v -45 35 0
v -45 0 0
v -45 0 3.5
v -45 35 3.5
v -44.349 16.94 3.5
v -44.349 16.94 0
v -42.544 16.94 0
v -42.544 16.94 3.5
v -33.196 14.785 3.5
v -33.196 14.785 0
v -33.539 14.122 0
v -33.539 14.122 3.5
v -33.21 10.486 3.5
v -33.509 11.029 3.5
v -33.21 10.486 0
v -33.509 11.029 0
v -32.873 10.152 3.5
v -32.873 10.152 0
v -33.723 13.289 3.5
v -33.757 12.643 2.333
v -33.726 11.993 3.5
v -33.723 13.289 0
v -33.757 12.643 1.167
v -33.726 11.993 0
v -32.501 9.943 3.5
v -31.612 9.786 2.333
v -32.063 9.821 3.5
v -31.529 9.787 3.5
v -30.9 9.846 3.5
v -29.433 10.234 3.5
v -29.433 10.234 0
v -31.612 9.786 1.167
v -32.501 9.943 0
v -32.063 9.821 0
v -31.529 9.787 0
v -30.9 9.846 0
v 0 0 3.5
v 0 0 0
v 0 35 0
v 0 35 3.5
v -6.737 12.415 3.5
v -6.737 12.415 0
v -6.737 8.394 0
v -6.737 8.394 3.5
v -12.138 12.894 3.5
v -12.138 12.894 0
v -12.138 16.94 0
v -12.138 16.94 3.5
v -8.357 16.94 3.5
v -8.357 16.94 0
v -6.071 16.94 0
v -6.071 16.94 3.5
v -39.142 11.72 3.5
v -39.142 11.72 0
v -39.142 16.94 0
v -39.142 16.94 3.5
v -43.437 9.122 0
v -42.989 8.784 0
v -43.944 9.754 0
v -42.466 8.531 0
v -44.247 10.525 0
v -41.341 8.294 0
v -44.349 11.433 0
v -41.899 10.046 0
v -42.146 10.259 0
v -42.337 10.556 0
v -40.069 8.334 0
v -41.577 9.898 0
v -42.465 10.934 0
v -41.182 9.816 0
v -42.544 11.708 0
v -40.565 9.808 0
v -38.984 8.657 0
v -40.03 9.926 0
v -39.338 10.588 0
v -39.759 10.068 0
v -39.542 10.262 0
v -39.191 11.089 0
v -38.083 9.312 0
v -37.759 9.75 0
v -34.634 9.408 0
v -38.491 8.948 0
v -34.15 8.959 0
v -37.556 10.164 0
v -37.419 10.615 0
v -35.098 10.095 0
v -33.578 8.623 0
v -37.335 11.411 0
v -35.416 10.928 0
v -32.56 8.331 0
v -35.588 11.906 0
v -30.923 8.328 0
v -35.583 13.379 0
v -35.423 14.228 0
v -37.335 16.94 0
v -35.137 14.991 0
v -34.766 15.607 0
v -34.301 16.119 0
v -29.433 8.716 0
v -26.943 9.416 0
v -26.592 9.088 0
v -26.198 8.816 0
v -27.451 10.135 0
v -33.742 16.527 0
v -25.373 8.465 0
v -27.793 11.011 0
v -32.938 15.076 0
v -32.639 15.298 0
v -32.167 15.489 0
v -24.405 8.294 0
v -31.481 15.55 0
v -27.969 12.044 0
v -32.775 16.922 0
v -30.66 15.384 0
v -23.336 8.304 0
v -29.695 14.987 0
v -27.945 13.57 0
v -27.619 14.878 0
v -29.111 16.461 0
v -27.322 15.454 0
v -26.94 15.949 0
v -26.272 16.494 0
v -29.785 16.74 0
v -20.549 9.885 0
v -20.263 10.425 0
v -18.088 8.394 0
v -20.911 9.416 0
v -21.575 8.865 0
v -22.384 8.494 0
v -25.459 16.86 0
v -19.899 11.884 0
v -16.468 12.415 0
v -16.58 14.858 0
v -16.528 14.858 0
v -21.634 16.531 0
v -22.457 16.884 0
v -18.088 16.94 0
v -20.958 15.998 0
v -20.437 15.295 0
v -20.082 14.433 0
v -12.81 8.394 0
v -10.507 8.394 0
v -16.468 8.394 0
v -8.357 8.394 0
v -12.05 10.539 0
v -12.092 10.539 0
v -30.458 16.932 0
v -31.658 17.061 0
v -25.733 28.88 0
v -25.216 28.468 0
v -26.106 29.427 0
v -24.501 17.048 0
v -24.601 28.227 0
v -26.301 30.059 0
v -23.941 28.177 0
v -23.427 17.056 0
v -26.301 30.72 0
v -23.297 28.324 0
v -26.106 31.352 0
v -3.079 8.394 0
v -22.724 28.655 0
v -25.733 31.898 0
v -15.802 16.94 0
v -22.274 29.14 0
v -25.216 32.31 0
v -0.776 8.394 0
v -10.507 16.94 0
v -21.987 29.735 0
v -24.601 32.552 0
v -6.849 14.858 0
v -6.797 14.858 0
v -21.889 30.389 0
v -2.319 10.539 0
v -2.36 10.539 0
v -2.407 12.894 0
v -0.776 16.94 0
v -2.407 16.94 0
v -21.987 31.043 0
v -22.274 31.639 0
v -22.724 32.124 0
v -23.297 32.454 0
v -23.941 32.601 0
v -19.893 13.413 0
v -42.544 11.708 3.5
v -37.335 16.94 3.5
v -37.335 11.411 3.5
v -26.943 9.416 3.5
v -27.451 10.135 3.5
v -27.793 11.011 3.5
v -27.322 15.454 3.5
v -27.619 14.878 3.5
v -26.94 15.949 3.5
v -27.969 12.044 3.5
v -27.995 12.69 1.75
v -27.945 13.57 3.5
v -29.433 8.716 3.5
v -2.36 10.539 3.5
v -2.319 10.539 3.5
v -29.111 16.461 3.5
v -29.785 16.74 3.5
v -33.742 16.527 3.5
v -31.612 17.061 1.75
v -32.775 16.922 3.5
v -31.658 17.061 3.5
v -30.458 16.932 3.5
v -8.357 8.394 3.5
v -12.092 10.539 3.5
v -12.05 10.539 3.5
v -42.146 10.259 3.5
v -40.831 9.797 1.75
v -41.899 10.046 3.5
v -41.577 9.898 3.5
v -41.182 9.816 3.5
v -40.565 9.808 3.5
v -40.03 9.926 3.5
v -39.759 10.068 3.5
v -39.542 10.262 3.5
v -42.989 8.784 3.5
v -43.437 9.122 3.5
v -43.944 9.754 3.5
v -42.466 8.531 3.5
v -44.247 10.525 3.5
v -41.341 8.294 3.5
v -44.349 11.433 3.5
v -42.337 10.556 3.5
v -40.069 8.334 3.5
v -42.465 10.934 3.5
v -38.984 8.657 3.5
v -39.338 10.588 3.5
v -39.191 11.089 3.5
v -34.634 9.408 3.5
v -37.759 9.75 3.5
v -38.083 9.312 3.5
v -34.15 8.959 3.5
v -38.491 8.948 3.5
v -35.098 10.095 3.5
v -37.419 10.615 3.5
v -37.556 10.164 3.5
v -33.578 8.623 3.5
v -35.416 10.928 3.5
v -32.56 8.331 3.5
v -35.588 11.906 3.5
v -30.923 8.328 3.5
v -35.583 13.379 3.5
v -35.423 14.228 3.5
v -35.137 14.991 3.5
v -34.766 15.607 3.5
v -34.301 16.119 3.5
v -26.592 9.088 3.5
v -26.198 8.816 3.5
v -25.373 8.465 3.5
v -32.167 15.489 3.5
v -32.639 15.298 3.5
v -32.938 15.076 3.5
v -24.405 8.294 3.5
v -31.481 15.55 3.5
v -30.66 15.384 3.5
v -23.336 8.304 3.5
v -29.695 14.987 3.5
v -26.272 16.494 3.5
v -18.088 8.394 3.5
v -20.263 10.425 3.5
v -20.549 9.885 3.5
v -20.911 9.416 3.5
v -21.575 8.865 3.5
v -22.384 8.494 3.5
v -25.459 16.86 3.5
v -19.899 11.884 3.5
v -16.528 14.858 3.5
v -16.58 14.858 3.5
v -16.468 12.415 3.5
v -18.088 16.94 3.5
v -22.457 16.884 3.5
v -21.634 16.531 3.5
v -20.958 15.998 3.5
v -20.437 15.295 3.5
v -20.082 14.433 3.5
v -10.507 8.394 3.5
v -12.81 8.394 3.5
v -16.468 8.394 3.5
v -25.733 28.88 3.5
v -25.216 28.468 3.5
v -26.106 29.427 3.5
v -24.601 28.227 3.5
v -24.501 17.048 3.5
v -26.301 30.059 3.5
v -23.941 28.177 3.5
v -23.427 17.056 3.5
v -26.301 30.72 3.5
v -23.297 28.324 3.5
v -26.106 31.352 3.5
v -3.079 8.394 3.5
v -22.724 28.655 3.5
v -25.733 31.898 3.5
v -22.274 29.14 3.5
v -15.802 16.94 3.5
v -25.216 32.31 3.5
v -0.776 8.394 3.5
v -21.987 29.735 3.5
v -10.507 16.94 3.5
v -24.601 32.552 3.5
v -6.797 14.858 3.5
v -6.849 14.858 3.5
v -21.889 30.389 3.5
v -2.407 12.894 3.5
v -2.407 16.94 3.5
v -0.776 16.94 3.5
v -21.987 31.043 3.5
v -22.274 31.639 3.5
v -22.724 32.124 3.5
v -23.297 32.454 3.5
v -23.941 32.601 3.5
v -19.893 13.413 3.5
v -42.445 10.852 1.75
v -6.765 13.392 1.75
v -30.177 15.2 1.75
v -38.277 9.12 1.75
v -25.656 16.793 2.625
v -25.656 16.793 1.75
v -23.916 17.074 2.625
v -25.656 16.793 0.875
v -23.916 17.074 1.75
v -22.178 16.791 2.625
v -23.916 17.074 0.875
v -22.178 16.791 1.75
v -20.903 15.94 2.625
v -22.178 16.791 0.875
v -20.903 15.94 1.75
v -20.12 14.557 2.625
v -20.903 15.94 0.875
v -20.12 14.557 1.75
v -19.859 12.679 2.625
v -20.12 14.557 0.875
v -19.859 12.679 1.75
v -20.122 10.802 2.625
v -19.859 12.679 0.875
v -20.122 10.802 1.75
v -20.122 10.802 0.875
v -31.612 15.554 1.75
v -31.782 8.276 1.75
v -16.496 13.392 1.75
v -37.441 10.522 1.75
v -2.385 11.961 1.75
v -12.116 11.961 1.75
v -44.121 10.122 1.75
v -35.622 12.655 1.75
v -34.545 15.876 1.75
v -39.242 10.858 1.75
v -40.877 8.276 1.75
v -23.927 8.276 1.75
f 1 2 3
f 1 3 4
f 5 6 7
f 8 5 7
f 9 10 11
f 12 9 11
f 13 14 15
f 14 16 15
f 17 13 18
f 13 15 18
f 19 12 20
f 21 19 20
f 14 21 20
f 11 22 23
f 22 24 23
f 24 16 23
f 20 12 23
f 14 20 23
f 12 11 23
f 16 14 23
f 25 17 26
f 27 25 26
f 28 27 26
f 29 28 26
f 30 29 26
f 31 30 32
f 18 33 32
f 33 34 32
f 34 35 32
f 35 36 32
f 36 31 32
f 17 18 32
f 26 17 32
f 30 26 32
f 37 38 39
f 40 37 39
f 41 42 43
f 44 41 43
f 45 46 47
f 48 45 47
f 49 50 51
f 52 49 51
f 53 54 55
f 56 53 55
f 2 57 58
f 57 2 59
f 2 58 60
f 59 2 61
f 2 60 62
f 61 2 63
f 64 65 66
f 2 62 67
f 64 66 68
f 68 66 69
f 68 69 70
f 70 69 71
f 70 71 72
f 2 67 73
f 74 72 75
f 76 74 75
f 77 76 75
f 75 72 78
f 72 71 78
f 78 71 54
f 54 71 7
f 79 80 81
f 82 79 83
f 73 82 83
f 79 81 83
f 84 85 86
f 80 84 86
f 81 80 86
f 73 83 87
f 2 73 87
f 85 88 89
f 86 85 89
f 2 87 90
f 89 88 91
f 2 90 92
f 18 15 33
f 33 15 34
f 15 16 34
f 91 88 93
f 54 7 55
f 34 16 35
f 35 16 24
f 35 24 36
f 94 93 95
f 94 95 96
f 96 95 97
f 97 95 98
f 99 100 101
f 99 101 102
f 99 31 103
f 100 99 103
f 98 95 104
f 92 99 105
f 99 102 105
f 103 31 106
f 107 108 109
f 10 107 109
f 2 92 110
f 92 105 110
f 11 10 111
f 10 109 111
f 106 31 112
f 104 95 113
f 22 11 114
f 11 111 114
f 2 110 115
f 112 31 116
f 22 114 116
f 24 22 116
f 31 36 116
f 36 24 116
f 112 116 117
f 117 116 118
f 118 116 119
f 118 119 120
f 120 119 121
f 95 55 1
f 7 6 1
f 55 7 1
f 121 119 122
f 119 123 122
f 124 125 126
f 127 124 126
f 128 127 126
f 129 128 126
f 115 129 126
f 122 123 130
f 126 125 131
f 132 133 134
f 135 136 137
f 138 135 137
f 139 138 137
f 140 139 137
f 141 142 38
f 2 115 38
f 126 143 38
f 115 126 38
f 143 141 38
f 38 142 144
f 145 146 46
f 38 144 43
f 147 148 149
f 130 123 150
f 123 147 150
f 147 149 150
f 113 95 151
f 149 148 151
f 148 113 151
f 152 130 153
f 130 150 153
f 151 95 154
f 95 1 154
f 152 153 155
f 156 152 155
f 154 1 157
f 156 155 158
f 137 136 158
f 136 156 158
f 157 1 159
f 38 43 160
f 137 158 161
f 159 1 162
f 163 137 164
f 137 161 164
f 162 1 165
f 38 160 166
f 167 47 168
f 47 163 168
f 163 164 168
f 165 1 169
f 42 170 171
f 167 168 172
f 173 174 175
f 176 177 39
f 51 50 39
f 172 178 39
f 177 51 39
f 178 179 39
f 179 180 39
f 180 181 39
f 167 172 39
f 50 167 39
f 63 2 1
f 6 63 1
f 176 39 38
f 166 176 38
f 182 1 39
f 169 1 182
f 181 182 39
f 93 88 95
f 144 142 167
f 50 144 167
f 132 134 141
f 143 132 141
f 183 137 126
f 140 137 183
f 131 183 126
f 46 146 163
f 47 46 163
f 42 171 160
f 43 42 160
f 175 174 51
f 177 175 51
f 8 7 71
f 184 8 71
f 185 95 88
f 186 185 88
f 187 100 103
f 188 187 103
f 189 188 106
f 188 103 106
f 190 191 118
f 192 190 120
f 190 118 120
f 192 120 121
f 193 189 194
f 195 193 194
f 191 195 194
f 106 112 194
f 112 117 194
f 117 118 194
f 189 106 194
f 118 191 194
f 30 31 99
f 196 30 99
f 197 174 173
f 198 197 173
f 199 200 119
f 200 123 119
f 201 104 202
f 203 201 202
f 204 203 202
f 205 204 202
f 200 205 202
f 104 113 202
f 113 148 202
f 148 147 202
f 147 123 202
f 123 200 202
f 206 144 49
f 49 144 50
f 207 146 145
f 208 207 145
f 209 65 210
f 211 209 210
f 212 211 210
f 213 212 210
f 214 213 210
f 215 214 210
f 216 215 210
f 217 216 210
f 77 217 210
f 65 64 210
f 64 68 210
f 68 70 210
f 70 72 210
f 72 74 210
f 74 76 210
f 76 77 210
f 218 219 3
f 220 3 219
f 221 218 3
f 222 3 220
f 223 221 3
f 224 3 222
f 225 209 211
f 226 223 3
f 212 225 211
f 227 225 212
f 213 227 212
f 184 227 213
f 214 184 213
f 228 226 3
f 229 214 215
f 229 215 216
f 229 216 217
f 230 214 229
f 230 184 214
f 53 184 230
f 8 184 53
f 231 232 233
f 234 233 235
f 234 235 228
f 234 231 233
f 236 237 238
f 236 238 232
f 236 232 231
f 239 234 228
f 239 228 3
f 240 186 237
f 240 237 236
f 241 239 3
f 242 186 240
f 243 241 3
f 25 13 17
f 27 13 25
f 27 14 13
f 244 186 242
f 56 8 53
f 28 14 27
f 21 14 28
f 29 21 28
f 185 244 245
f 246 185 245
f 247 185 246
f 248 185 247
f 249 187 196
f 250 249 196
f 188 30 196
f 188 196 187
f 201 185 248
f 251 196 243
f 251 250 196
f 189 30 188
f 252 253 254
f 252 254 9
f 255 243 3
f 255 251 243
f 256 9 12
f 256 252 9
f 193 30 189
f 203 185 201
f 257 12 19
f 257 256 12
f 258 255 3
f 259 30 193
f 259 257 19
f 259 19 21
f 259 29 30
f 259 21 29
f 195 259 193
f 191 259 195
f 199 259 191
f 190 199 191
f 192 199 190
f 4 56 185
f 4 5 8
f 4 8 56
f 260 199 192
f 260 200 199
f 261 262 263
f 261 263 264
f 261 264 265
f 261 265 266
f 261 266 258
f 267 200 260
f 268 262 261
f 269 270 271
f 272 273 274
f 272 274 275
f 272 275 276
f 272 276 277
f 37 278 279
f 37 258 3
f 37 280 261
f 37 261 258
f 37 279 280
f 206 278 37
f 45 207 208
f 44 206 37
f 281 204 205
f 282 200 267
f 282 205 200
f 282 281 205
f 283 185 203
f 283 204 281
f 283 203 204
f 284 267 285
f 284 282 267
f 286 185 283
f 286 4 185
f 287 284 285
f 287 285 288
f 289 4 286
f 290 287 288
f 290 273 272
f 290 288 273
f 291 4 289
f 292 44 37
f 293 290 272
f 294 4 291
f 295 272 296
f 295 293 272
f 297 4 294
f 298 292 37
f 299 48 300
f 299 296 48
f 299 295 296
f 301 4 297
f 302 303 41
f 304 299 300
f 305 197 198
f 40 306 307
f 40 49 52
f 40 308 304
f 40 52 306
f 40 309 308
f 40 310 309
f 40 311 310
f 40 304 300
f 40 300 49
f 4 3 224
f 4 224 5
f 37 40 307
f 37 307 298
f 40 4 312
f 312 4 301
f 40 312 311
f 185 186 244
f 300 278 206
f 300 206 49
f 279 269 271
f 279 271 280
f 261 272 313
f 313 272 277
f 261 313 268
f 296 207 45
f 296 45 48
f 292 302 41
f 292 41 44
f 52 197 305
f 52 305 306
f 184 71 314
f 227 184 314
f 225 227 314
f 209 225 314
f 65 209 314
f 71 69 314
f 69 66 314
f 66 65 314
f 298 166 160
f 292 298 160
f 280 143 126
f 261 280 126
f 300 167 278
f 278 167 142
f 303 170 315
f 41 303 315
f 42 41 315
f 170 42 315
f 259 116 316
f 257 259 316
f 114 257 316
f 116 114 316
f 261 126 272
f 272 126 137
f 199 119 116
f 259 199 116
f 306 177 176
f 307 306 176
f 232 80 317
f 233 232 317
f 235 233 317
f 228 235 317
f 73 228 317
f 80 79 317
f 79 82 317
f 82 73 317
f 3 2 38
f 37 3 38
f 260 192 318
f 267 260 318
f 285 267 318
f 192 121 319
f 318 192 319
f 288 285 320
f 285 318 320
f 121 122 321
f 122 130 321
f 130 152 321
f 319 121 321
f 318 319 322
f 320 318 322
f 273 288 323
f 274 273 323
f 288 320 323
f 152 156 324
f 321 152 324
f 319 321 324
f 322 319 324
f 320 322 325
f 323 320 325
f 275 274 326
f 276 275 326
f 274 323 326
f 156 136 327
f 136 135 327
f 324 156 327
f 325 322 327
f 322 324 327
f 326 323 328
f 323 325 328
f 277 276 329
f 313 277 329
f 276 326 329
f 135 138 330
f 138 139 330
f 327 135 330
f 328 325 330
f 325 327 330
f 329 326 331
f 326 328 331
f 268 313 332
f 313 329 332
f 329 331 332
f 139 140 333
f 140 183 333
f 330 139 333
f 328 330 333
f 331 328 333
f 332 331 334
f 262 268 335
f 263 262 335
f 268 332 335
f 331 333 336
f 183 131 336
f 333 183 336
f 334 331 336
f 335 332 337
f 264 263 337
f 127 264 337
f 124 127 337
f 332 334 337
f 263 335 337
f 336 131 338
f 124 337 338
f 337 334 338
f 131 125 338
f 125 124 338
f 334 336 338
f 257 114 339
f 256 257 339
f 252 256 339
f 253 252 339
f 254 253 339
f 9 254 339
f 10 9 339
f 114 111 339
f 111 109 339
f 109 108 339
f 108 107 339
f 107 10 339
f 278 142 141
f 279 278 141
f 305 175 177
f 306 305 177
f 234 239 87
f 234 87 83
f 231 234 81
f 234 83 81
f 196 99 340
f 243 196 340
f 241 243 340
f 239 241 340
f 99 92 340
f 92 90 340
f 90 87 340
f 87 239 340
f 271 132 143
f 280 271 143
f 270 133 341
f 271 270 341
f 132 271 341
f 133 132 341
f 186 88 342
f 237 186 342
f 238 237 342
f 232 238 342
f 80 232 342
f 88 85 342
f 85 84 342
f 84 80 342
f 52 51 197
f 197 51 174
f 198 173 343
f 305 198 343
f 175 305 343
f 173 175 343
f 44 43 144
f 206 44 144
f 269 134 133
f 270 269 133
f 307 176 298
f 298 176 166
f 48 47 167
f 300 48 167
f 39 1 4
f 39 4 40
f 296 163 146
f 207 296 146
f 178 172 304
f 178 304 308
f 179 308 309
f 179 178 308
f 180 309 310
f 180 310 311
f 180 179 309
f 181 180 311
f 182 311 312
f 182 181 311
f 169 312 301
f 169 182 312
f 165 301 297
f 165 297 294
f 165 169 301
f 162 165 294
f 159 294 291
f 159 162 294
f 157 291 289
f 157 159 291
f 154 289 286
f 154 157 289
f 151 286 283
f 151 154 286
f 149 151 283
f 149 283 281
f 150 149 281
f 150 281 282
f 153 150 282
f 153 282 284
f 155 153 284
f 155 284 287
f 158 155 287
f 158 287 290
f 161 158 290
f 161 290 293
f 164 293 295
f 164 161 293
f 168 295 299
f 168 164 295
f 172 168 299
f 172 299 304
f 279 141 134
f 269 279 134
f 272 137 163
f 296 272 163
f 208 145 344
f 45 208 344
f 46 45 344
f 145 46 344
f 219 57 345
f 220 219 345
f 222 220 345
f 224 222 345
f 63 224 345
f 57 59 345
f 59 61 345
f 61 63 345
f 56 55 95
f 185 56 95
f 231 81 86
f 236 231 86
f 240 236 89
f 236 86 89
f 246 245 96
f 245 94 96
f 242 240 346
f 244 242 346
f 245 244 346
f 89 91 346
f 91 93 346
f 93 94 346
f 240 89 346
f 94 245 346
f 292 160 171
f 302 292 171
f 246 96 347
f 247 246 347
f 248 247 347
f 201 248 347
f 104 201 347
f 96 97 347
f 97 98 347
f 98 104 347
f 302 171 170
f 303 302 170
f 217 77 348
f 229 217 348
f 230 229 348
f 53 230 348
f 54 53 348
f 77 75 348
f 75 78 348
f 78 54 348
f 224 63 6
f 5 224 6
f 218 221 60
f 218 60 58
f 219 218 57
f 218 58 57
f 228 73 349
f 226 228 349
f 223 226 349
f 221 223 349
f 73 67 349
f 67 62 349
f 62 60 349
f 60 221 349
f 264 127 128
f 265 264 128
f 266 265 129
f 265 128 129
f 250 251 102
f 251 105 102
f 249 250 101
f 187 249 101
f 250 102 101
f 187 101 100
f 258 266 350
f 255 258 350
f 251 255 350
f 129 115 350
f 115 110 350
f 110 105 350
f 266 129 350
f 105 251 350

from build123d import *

# Parameters (mm, degrees)
F0_W     = 45
F0_H     = 35
F0_R     = 2.2182693531
F1_DEPTH = 3.5


with BuildPart() as f1:
    # F0 (on Top) → F1 (new body)
    with BuildSketch(Plane.XY):
        with Locations((-22.5, 17.5)):
            Rectangle(F0_W, F0_H)
        with BuildLine():
            Line((-39.1418465407, 16.9395460091), (-37.3351271333, 16.9395460091))
            Line((-37.3351271333, 16.9395460091), (-37.3351271333, 11.41090981))
            add(Edge.make_bspline(
                [(-37.3351271333, 11.41090981), (-37.3351271333, 10.4626626676), (-37.7587523359, 9.7500745783)],
                knots=[0, 0, 0, 1, 1, 1], degree=2))
            add(Edge.make_bspline(
                [(-37.7587523359, 9.7500745783), (-38.1823775386, 9.0374864891), (-38.9838053503, 8.6568784152)],
                knots=[0, 0, 0, 1, 1, 1], degree=2))
            add(Edge.make_bspline(
                [(-38.9838053503, 8.6568784152), (-39.785233162, 8.2762703412), (-40.8774941702, 8.2762703412)],
                knots=[0, 0, 0, 1, 1, 1], degree=2))
            add(Edge.make_bspline(
                [(-40.8774941702, 8.2762703412), (-42.5252372322, 8.2762703412), (-43.4370133307, 9.1216504366)],
                knots=[0, 0, 0, 1, 1, 1], degree=2))
            add(Edge.make_bspline(
                [(-43.4370133307, 9.1216504366), (-44.3487894291, 9.967030532), (-44.3487894291, 11.4333535293)],
                knots=[0, 0, 0, 1, 1, 1], degree=2))
            Line((-44.3487894291, 11.4333535293), (-44.3487894291, 16.9395460091))
            Line((-44.3487894291, 16.9395460091), (-42.5439403317, 16.9395460091))
            Line((-42.5439403317, 16.9395460091), (-42.5439403317, 11.7082890913))
            add(Edge.make_bspline(
                [(-42.5439403317, 11.7082890913), (-42.5439403317, 10.7207654401), (-42.1464994682, 10.2587988835)],
                knots=[0, 0, 0, 1, 1, 1], degree=2))
            add(Edge.make_bspline(
                [(-42.1464994682, 10.2587988835), (-41.7490586048, 9.796832327), (-40.8307364215, 9.796832327)],
                knots=[0, 0, 0, 1, 1, 1], degree=2))
            add(Edge.make_bspline(
                [(-40.8307364215, 9.796832327), (-39.9423391974, 9.796832327), (-39.542092869, 10.2616043485)],
                knots=[0, 0, 0, 1, 1, 1], degree=2))
            add(Edge.make_bspline(
                [(-39.542092869, 10.2616043485), (-39.1418465407, 10.7263763699), (-39.1418465407, 11.719510951)],
                knots=[0, 0, 0, 1, 1, 1], degree=2))
            Line((-39.1418465407, 11.719510951), (-39.1418465407, 16.9395460091))
        make_face(mode=Mode.SUBTRACT)
        with BuildLine():
            add(Edge.make_bspline(
                [(-30.6599909376, 15.3843832893), (-31.1444012135, 15.5536463394), (-31.6119786999, 15.5536463394)],
                knots=[0, 0, 0, 1, 1, 1], degree=2))
            add(Edge.make_bspline(
                [(-31.6119786999, 15.5536463394), (-32.6350382401, 15.5536463394), (-33.1961312237, 14.7849489518)],
                knots=[0, 0, 0, 1, 1, 1], degree=2))
            add(Edge.make_bspline(
                [(-33.1961312237, 14.7849489518), (-33.7572242074, 14.0162515642), (-33.7572242074, 12.6434440641)],
                knots=[0, 0, 0, 1, 1, 1], degree=2))
            add(Edge.make_bspline(
                [(-33.7572242074, 12.6434440641), (-33.7572242074, 9.7856104673), (-31.6119786999, 9.7856104673)],
                knots=[0, 0, 0, 1, 1, 1], degree=2))
            add(Edge.make_bspline(
                [(-31.6119786999, 9.7856104673), (-30.712359616, 9.7856104673), (-29.4330676133, 10.2344848542)],
                knots=[0, 0, 0, 1, 1, 1], degree=2))
            Line((-29.4330676133, 10.2344848542), (-29.4330676133, 8.7157931784))
            add(Edge.make_bspline(
                [(-29.4330676133, 8.7157931784), (-30.4841818027, 8.2762703412), (-31.7821769049, 8.2762703412)],
                knots=[0, 0, 0, 1, 1, 1], degree=2))
            add(Edge.make_bspline(
                [(-31.7821769049, 8.2762703412), (-33.6468759206, 8.2762703412), (-34.6343995719, 9.4078078583)],
                knots=[0, 0, 0, 1, 1, 1], degree=2))
            add(Edge.make_bspline(
                [(-34.6343995719, 9.4078078583), (-35.6219232231, 10.5393453754), (-35.6219232231, 12.6546659238)],
                knots=[0, 0, 0, 1, 1, 1], degree=2))
            add(Edge.make_bspline(
                [(-35.6219232231, 12.6546659238), (-35.6219232231, 13.988196915), (-35.1365777923, 14.9906830458)],
                knots=[0, 0, 0, 1, 1, 1], degree=2))
            add(Edge.make_bspline(
                [(-35.1365777923, 14.9906830458), (-34.6512323614, 15.9931691766), (-33.7422617278, 16.5271426661)],
                knots=[0, 0, 0, 1, 1, 1], degree=2))
            add(Edge.make_bspline(
                [(-33.7422617278, 16.5271426661), (-32.8332910943, 17.0611161555), (-31.6119786999, 17.0611161555)],
                knots=[0, 0, 0, 1, 1, 1], degree=2))
            add(Edge.make_bspline(
                [(-31.6119786999, 17.0611161555), (-30.3682225861, 17.0611161555), (-29.1113743026, 16.460746663)],
                knots=[0, 0, 0, 1, 1, 1], degree=2))
            Line((-29.1113743026, 16.460746663), (-29.6949110057, 14.9869424259))
            add(Edge.make_bspline(
                [(-29.6949110057, 14.9869424259), (-30.1755806617, 15.2151202393), (-30.6599909376, 15.3843832893)],
                knots=[0, 0, 0, 1, 1, 1], degree=2))
        make_face(mode=Mode.SUBTRACT)
        with BuildLine():
            add(Edge.make_bspline(
                [(-20.9025839516, 15.9398653432), (-19.858951002, 14.8055223612), (-19.858951002, 12.6789799531)],
                knots=[0, 0, 0, 1, 1, 1], degree=2))
            add(Edge.make_bspline(
                [(-19.858951002, 12.6789799531), (-19.858951002, 10.5561781649), (-20.9110003463, 9.4162242531)],
                knots=[0, 0, 0, 1, 1, 1], degree=2))
            add(Edge.make_bspline(
                [(-20.9110003463, 9.4162242531), (-21.9630496907, 8.2762703412), (-23.9268751335, 8.2762703412)],
                knots=[0, 0, 0, 1, 1, 1], degree=2))
            add(Edge.make_bspline(
                [(-23.9268751335, 8.2762703412), (-25.8907005764, 8.2762703412), (-26.9427499208, 9.4162242531)],
                knots=[0, 0, 0, 1, 1, 1], degree=2))
            add(Edge.make_bspline(
                [(-26.9427499208, 9.4162242531), (-27.9947992651, 10.5561781649), (-27.9947992651, 12.6902018128)],
                knots=[0, 0, 0, 1, 1, 1], degree=2))
            add(Edge.make_bspline(
                [(-27.9947992651, 12.6902018128), (-27.9947992651, 14.8242254606), (-26.9399444558, 15.9492168929)],
                knots=[0, 0, 0, 1, 1, 1], degree=2))
            add(Edge.make_bspline(
                [(-26.9399444558, 15.9492168929), (-25.8850896466, 17.0742083252), (-23.9156532739, 17.0742083252)],
                knots=[0, 0, 0, 1, 1, 1], degree=2))
            add(Edge.make_bspline(
                [(-23.9156532739, 17.0742083252), (-21.9462169012, 17.0742083252), (-20.9025839516, 15.9398653432)],
                knots=[0, 0, 0, 1, 1, 1], degree=2))
        make_face(mode=Mode.SUBTRACT)
        with BuildLine():
            Line((-10.5074012742, 16.9395460091), (-10.5074012742, 8.3940998678))
            Line((-10.5074012742, 8.3940998678), (-12.8097528171, 8.3940998678))
            Line((-12.8097528171, 8.3940998678), (-16.5279289889, 14.8578910397))
            Line((-16.5279289889, 14.8578910397), (-16.5802976674, 14.8578910397))
            add(Edge.make_bspline(
                [(-16.5802976674, 14.8578910397), (-16.4680790707, 13.1465574395), (-16.4680790707, 12.4152662508)],
                knots=[0, 0, 0, 1, 1, 1], degree=2))
            Line((-16.4680790707, 12.4152662508), (-16.4680790707, 8.3940998678))
            Line((-16.4680790707, 8.3940998678), (-18.0877674835, 8.3940998678))
            Line((-18.0877674835, 8.3940998678), (-18.0877674835, 16.9395460091))
            Line((-18.0877674835, 16.9395460091), (-15.80224873, 16.9395460091))
            Line((-15.80224873, 16.9395460091), (-12.091553798, 10.5393453754))
            Line((-12.091553798, 10.5393453754), (-12.0504069792, 10.5393453754))
            add(Edge.make_bspline(
                [(-12.0504069792, 10.5393453754), (-12.1383115467, 12.2057915369), (-12.1383115467, 12.8940655968)],
                knots=[0, 0, 0, 1, 1, 1], degree=2))
            Line((-12.1383115467, 12.8940655968), (-12.1383115467, 16.9395460091))
            Line((-12.1383115467, 16.9395460091), (-10.5074012742, 16.9395460091))
        make_face(mode=Mode.SUBTRACT)
        with BuildLine():
            Line((-0.7761786274, 16.9395460091), (-0.7761786274, 8.3940998678))
            Line((-0.7761786274, 8.3940998678), (-3.0785301704, 8.3940998678))
            Line((-3.0785301704, 8.3940998678), (-6.7967063422, 14.8578910397))
            Line((-6.7967063422, 14.8578910397), (-6.8490750206, 14.8578910397))
            add(Edge.make_bspline(
                [(-6.8490750206, 14.8578910397), (-6.7368564239, 13.1465574395), (-6.7368564239, 12.4152662508)],
                knots=[0, 0, 0, 1, 1, 1], degree=2))
            Line((-6.7368564239, 12.4152662508), (-6.7368564239, 8.3940998678))
            Line((-6.7368564239, 8.3940998678), (-8.3565448368, 8.3940998678))
            Line((-8.3565448368, 8.3940998678), (-8.3565448368, 16.9395460091))
            Line((-8.3565448368, 16.9395460091), (-6.0710260833, 16.9395460091))
            Line((-6.0710260833, 16.9395460091), (-2.3603311513, 10.5393453754))
            Line((-2.3603311513, 10.5393453754), (-2.3191843325, 10.5393453754))
            add(Edge.make_bspline(
                [(-2.3191843325, 10.5393453754), (-2.4070888999, 12.2057915369), (-2.4070888999, 12.8940655968)],
                knots=[0, 0, 0, 1, 1, 1], degree=2))
            Line((-2.4070888999, 12.8940655968), (-2.4070888999, 16.9395460091))
            Line((-2.4070888999, 16.9395460091), (-0.7761786274, 16.9395460091))
        make_face(mode=Mode.SUBTRACT)
        with Locations((-24.1070296615, 30.3892251104)):
            Circle(F0_R, mode=Mode.SUBTRACT)
    extrude(amount=F1_DEPTH)


solid = f1.part
